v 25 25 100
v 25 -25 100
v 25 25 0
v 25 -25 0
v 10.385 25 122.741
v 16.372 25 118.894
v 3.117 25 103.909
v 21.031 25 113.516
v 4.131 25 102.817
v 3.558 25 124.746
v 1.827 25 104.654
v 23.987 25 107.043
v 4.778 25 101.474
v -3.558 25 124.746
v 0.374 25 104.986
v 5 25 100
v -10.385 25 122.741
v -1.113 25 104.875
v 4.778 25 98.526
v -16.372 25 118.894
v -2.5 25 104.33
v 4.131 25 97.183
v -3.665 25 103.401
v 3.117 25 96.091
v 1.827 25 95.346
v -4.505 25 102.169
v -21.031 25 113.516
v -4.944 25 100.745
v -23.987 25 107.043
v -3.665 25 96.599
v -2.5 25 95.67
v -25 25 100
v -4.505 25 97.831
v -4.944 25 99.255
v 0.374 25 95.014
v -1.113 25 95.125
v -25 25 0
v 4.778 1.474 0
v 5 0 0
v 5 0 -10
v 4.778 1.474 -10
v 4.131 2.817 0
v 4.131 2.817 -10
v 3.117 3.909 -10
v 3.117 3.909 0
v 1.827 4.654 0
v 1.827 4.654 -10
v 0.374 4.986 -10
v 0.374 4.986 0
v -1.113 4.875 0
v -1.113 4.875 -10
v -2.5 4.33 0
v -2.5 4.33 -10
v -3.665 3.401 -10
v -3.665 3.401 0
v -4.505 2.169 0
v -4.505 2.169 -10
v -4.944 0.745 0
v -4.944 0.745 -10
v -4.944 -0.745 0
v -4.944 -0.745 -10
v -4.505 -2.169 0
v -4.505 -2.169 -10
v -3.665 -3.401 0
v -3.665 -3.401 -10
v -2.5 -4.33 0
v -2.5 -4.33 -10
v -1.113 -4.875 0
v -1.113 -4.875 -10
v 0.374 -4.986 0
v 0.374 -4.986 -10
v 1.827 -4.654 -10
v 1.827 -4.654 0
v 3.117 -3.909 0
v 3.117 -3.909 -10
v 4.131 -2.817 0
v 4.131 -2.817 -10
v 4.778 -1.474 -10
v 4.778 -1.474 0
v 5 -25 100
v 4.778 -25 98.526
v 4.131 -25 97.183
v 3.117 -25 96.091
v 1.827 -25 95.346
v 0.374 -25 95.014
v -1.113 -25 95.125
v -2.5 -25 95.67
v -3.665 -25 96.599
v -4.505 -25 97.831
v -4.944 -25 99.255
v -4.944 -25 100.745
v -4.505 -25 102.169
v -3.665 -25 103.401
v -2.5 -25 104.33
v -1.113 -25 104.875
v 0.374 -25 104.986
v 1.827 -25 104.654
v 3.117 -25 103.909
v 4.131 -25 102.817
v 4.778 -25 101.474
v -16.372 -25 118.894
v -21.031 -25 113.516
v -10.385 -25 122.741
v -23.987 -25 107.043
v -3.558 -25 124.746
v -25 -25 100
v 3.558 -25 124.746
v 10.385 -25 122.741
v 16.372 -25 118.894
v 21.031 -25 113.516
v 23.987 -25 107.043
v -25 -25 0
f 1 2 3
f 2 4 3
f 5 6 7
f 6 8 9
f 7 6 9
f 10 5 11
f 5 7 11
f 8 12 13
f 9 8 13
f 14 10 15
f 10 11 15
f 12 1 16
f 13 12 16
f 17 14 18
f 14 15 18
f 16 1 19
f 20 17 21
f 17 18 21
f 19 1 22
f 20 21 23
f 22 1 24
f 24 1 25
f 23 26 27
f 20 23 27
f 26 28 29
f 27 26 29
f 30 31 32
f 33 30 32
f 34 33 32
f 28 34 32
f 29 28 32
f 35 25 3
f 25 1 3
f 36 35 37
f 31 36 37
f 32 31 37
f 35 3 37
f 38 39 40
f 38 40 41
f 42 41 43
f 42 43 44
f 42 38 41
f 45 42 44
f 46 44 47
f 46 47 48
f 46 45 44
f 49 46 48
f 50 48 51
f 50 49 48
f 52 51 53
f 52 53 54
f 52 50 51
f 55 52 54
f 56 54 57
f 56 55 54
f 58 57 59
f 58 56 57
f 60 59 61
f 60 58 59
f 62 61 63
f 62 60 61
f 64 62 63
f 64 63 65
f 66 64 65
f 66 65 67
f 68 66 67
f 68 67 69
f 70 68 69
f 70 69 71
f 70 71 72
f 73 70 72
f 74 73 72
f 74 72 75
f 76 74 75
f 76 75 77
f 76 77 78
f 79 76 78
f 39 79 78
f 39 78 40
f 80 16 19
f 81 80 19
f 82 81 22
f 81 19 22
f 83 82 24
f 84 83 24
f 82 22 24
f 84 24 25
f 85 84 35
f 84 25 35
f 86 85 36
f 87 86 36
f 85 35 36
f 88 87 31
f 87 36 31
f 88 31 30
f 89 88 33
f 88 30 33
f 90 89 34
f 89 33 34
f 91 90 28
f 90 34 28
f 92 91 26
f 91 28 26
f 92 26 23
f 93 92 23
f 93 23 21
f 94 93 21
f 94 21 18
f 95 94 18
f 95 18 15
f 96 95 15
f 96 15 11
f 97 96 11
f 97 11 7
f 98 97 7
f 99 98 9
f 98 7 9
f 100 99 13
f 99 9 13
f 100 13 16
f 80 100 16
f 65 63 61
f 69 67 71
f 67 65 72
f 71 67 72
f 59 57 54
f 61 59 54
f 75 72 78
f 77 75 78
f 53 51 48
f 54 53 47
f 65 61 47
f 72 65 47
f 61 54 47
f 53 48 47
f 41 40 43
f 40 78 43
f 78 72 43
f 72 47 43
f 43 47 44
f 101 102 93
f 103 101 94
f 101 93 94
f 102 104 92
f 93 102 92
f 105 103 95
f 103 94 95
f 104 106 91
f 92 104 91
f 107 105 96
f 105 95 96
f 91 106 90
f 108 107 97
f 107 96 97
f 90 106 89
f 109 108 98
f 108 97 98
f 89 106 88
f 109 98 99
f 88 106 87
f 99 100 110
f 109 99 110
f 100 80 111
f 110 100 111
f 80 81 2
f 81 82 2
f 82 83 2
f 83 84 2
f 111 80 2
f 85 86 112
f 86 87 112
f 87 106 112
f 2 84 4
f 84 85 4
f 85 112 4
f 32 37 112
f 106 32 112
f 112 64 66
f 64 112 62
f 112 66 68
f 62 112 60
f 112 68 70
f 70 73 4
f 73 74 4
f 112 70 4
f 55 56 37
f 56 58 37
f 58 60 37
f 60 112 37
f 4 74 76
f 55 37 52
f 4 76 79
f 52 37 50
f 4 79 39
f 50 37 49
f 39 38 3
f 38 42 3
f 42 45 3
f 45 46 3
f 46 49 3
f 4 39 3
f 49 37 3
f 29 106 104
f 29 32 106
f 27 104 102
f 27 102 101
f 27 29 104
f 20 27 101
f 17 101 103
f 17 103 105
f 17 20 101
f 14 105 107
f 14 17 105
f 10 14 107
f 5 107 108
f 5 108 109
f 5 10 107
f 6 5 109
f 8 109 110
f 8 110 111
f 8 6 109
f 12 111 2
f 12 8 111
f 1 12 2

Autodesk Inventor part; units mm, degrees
ref_plane "YZ Plane" through (0, 0, 0) normal (1, 0, 0) x (0, 1, 0)
ref_plane "XZ Plane" through (0, 0, 0) normal (0, 1, 0) x (-1, 0, 0)
ref_plane "XY Plane" through (0, 0, 0) normal (0, 0, 1) x (1, 0, 0)
sketch "Sketch1" plane through (0, 0, 0) normal (0, 0, 1) x (1, 0, 0)
  circle A0 centre (0, 0) radius 5
  dimension "d0" = 10
extrude "Extrusion1" add sketch "Sketch1" against normal blind 10
sketch "Sketch2" plane through (0, 0, 0) normal (0, 0, 1) x (1, 0, 0)
  line L0 (25, 25) -> (-25, 25)
  line L1 (-25, 25) -> (-25, -25)
  line L2 (-25, -25) -> (25, -25)
  line L3 (25, -25) -> (25, 25)
  point P0 (0, 0)
  dimension "d3" = 50
  dimension "d4" = 50
  dimension "d5" = 25
  dimension "d6" = 25
extrude "Extrusion2" add sketch "Sketch2" along normal blind 125
sketch "Sketch3" plane through (-25, 25, 0) normal (0, 1, 0) x (1, 0, 0)
  circle A0 centre (25, -100) radius 25
  line L0 (50, 0) -> (50, -125) projected
  line L1 (50, -125) -> (0, -125) projected
  line L2 (0, 0) -> (0, -125) projected
  circle A1 centre (25, -100) radius 5
  point P0 (25, 0)
  point P1 (25, -125)
  point P2 (50, -100)
  point P3 (0, -100)
  dimension "d9" = 10
extrude "Extrusion3" cut sketch "Sketch3" against normal through all contours L0 L1 A0 | A0 L1 L2 | A1
equation "\"d4\" = d3"
equation "\"d5\" = 0.5 * d3"
equation "\"d6\" = d5"
properties part number "link4"
